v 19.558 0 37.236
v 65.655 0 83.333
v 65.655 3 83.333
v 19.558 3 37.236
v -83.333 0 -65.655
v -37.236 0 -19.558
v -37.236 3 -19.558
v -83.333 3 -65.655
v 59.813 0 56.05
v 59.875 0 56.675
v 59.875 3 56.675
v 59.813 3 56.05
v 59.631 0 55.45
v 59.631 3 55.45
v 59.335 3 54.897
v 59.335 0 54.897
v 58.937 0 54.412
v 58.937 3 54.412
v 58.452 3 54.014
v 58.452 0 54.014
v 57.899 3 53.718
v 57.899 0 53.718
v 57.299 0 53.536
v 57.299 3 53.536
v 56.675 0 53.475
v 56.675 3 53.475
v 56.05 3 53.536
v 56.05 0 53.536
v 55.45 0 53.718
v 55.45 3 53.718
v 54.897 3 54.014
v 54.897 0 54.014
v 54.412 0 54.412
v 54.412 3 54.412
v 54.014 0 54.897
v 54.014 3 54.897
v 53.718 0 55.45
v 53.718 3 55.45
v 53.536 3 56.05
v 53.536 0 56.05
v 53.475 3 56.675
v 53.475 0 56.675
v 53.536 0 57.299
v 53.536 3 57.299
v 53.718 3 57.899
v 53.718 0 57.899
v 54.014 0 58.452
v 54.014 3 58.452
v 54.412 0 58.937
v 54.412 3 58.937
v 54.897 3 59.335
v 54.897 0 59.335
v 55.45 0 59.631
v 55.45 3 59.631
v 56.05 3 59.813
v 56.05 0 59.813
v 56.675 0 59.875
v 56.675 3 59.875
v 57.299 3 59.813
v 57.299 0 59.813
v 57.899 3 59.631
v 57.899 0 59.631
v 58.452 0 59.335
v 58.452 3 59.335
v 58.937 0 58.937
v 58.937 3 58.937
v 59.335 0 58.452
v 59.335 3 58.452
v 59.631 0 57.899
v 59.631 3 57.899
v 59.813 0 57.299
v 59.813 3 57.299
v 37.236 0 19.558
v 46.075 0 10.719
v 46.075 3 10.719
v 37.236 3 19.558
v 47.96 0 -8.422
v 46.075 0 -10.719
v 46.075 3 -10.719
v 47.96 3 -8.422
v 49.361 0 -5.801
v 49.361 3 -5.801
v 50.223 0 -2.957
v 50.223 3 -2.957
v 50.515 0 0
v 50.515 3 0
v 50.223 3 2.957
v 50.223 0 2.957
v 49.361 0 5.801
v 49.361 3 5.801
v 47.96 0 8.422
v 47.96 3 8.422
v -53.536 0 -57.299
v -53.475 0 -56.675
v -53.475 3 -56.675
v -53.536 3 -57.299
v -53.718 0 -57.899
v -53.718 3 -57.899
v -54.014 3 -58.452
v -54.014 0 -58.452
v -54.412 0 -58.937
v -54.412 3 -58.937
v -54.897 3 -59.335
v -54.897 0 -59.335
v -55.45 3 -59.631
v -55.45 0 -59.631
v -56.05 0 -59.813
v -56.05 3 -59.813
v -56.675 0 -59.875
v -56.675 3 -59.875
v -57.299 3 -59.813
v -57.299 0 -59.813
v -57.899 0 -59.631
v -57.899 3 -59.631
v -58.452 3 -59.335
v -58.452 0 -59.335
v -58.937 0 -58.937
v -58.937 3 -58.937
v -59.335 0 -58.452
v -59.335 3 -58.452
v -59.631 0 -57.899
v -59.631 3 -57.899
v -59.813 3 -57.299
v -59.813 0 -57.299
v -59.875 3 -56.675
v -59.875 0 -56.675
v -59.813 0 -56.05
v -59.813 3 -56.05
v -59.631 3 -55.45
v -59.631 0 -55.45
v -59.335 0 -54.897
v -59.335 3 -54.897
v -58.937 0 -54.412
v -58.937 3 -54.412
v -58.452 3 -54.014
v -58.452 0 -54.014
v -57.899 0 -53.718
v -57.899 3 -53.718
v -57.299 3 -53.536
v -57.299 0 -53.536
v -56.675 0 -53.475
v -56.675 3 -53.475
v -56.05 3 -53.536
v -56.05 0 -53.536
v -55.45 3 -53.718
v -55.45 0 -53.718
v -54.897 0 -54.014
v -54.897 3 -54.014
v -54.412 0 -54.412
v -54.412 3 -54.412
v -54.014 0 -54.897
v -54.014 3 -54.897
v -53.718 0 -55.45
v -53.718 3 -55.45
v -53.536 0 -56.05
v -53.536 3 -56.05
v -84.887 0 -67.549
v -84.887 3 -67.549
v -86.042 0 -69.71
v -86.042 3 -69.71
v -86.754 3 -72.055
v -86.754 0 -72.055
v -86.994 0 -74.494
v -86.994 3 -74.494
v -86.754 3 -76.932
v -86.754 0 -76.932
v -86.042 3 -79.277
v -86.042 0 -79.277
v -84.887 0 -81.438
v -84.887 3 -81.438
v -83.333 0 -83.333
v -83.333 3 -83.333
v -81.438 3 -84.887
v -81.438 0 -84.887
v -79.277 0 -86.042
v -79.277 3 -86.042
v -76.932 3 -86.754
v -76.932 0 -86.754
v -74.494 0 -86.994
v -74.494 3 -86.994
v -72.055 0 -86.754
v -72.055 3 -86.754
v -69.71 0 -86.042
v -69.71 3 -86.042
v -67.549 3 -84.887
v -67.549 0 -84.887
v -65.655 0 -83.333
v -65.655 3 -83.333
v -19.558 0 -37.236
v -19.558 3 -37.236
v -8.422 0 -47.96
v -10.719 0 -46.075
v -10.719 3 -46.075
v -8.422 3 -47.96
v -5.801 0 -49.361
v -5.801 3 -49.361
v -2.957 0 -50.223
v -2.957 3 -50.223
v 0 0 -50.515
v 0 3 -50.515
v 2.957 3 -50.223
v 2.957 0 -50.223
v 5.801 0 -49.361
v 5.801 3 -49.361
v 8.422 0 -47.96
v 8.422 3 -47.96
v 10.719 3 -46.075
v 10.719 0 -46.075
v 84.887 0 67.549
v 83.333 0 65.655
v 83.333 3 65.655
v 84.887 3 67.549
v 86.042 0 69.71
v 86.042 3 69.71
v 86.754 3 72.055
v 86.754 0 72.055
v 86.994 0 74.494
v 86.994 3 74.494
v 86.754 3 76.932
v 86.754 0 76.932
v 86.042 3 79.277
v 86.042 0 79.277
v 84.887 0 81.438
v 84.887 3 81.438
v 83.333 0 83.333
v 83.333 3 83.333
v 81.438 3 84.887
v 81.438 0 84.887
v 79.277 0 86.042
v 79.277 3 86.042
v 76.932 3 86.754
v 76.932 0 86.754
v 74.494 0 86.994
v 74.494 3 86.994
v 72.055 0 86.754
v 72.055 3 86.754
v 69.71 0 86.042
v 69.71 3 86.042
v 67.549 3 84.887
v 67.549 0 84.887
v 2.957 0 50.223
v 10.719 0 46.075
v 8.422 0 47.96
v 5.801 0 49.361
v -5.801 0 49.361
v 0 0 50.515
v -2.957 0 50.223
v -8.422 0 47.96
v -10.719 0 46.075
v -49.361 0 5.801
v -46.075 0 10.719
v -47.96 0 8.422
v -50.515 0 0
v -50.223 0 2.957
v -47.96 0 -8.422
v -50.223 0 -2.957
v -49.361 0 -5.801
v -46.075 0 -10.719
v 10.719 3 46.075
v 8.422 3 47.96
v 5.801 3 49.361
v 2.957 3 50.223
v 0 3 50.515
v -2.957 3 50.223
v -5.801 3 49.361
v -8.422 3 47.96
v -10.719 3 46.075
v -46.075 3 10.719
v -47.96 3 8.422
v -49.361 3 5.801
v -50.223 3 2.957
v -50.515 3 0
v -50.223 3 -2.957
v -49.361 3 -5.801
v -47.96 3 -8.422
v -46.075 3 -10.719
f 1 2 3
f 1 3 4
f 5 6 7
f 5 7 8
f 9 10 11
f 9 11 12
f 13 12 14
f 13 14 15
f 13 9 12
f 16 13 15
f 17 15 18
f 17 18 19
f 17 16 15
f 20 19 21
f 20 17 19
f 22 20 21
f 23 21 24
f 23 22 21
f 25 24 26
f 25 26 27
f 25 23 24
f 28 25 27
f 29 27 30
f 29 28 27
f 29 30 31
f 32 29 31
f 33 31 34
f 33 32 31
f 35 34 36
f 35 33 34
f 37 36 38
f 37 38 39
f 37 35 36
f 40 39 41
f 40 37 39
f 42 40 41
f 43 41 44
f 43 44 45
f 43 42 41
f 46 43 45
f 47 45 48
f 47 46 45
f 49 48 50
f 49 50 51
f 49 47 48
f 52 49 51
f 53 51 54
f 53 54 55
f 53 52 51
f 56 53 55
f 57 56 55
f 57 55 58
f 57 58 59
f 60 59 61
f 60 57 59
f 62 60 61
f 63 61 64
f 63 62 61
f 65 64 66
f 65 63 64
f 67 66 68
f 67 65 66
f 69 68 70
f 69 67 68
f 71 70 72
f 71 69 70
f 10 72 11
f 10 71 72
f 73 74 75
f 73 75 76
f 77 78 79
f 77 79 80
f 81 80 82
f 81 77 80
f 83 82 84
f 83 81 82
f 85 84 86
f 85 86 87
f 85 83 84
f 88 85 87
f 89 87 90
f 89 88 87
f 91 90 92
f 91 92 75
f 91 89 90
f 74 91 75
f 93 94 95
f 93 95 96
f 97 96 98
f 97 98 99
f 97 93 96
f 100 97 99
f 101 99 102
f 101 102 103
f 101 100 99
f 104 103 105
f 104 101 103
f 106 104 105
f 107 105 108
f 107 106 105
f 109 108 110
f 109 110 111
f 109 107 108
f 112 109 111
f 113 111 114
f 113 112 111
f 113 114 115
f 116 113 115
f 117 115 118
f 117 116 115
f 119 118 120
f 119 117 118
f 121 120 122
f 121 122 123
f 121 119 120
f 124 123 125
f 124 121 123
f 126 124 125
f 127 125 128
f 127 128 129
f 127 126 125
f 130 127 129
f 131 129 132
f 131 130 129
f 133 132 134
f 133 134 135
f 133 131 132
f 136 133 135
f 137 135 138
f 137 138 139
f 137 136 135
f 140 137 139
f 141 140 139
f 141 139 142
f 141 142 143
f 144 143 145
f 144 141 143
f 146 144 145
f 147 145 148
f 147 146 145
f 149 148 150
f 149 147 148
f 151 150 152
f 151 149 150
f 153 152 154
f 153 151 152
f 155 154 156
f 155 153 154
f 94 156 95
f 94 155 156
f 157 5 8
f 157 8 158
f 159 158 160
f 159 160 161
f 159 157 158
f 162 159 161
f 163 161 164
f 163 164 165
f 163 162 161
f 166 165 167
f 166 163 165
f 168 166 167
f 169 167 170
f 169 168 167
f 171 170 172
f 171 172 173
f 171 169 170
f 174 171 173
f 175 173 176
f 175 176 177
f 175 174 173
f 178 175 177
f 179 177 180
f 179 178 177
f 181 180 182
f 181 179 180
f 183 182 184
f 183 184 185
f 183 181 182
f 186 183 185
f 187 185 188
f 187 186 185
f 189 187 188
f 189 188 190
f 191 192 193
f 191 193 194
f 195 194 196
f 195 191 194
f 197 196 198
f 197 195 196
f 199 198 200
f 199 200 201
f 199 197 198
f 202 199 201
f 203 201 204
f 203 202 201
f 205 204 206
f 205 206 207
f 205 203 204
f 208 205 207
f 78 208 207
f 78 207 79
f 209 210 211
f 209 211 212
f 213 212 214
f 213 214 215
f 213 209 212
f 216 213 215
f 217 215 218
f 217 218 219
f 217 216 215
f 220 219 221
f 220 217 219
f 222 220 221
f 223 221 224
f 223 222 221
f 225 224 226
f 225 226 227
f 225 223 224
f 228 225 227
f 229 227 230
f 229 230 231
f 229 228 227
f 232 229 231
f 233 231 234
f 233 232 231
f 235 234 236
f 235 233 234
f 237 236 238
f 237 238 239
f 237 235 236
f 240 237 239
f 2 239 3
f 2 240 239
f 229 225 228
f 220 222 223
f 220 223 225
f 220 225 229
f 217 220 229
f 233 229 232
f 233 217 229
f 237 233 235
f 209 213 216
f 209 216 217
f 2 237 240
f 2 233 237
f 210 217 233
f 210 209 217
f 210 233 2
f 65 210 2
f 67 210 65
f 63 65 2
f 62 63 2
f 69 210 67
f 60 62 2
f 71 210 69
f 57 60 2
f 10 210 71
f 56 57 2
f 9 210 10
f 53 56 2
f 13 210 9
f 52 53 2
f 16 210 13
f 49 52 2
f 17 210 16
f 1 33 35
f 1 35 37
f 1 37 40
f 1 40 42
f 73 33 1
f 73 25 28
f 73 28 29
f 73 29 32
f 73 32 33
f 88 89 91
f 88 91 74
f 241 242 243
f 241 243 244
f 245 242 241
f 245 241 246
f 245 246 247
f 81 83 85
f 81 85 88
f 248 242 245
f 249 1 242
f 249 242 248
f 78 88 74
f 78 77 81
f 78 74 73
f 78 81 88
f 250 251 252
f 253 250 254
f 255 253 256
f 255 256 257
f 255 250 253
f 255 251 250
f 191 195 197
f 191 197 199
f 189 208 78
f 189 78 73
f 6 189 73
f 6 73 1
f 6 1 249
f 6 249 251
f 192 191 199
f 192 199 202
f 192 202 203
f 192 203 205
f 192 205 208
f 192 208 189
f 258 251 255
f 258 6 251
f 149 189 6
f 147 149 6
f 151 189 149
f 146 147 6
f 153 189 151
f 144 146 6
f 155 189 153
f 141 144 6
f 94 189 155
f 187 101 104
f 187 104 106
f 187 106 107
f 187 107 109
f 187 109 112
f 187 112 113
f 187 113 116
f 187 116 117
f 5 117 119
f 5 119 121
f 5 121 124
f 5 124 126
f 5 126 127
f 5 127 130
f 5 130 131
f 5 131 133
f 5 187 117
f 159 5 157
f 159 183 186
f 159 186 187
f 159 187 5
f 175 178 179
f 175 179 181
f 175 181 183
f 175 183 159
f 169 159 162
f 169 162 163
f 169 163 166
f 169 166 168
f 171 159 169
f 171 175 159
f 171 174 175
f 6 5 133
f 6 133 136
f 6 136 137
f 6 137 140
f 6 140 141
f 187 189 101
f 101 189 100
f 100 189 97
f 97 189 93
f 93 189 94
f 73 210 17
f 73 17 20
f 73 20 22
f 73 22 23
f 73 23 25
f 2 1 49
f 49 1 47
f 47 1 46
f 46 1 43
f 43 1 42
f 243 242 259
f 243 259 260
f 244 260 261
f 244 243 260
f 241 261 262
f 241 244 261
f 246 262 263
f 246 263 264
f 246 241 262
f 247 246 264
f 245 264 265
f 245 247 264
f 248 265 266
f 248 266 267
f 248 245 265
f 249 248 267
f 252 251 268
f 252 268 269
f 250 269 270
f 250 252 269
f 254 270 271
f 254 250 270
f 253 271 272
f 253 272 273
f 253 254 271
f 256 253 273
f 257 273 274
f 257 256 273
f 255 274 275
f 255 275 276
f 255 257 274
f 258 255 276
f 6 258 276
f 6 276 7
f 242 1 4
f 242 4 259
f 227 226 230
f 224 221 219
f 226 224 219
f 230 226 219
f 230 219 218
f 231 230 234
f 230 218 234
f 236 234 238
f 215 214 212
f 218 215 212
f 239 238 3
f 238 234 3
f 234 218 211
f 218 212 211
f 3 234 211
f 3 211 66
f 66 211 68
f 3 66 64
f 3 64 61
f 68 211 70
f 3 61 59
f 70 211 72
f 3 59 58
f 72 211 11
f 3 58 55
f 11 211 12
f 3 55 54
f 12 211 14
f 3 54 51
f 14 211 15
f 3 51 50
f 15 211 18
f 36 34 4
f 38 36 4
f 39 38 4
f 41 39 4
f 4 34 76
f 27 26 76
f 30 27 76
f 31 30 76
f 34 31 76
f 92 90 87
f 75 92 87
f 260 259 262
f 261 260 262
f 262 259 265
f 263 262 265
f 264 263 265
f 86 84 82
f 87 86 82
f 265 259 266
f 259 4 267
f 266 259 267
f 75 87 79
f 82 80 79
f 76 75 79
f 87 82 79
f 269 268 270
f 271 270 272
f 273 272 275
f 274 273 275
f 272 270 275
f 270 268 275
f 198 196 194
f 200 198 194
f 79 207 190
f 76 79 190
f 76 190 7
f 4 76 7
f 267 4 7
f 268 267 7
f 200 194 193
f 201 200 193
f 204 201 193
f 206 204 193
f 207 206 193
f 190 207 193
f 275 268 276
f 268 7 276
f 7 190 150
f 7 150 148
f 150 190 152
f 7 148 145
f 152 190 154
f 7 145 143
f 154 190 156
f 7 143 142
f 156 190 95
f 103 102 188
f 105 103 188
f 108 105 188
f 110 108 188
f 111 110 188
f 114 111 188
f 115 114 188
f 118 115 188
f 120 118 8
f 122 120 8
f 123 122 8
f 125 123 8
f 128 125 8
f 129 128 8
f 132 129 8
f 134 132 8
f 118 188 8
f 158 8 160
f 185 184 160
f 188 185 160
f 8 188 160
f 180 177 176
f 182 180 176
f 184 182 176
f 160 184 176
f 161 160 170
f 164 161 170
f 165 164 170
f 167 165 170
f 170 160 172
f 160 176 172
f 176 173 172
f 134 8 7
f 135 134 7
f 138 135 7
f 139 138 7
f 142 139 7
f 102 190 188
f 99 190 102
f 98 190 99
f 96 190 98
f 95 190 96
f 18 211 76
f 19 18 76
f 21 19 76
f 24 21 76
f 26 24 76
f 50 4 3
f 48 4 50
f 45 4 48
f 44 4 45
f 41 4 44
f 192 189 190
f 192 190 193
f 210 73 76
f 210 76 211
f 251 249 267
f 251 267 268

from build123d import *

# Parameters (mm, degrees)
SKETCH1_R           = 3.2
BOSS_EXTRUDE1_DEPTH = 3


with BuildPart() as part:
    # Sketch1 → Boss-Extrude1 (new body)
    with BuildSketch(Plane(origin=(0, 0, 0), x_dir=(1, 0, 0), z_dir=(0, 1, 0))):
        with BuildLine():
            Line((-46.074522422, 10.719183363), (-37.235687657, 19.558018127))
            Line((-37.235687657, 19.558018127), (-74.493699398, 56.816029868))
            Line((-74.493699398, 56.816029868), (-83.332534163, 65.654864633))
            ThreePointArc((-83.332534163, 65.654864633), (-83.332534163, 83.332534163), (-65.654864633, 83.332534163))
            Line((-65.654864633, 83.332534163), (-56.816029868, 74.493699398))
            Line((-56.816029868, 74.493699398), (-19.558018127, 37.235687657))
            Line((-19.558018127, 37.235687657), (-10.719183363, 46.074522422))
            ThreePointArc((-10.719183363, 46.074522422), (0, 50.514553548), (10.719183363, 46.074522422))
            Line((10.719183363, 46.074522422), (46.074522422, 10.719183363))
            ThreePointArc((46.074522422, 10.719183363), (50.514553548, 0), (46.074522422, -10.719183363))
            Line((46.074522422, -10.719183363), (37.235687657, -19.558018127))
            Line((37.235687657, -19.558018127), (74.493699398, -56.816029868))
            Line((74.493699398, -56.816029868), (83.332534163, -65.654864633))
            ThreePointArc((83.332534163, -65.654864633), (83.332534163, -83.332534163), (65.654864633, -83.332534163))
            Line((65.654864633, -83.332534163), (56.816029868, -74.493699398))
            Line((56.816029868, -74.493699398), (19.558018127, -37.235687657))
            Line((19.558018127, -37.235687657), (10.719183363, -46.074522422))
            ThreePointArc((10.719183363, -46.074522422), (0, -50.514553548), (-10.719183363, -46.074522422))
            Line((-10.719183363, -46.074522422), (-46.074522422, -10.719183363))
            ThreePointArc((-46.074522422, -10.719183363), (-50.514553548, 0), (-46.074522422, 10.719183363))
        make_face()
        with Locations((56.674608512, -56.674608512)):
            Circle(SKETCH1_R, mode=Mode.SUBTRACT)
        with Locations((-56.674608512, 56.674608512)):
            Circle(SKETCH1_R, mode=Mode.SUBTRACT)
    extrude(amount=BOSS_EXTRUDE1_DEPTH)


solid = part.part
